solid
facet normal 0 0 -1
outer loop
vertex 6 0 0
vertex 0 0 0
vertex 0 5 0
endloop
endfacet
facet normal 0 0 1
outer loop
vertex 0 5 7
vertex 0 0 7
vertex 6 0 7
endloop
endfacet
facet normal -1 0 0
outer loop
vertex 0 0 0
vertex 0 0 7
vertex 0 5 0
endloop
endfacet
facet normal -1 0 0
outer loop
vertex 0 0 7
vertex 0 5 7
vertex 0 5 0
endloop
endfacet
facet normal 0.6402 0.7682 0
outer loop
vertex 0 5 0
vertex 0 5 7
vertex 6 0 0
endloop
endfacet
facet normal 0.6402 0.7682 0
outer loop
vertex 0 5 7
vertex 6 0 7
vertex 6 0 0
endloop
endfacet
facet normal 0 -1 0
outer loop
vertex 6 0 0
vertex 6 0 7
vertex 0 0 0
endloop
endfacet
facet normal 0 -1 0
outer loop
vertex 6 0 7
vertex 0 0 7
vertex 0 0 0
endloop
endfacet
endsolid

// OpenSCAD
chamferCut(outer=false);

module chamferCut(size=[5,6,7],outer=true){
    if(outer)
    linear_extrude(size.z)polygon([[0,0],[0,-size.y],[-size.x,0]]);
    if(!outer)mirror([1,1,0])
    linear_extrude(size.z)polygon([[0,0],[0,-size.y],[-size.x,0]]);
}
